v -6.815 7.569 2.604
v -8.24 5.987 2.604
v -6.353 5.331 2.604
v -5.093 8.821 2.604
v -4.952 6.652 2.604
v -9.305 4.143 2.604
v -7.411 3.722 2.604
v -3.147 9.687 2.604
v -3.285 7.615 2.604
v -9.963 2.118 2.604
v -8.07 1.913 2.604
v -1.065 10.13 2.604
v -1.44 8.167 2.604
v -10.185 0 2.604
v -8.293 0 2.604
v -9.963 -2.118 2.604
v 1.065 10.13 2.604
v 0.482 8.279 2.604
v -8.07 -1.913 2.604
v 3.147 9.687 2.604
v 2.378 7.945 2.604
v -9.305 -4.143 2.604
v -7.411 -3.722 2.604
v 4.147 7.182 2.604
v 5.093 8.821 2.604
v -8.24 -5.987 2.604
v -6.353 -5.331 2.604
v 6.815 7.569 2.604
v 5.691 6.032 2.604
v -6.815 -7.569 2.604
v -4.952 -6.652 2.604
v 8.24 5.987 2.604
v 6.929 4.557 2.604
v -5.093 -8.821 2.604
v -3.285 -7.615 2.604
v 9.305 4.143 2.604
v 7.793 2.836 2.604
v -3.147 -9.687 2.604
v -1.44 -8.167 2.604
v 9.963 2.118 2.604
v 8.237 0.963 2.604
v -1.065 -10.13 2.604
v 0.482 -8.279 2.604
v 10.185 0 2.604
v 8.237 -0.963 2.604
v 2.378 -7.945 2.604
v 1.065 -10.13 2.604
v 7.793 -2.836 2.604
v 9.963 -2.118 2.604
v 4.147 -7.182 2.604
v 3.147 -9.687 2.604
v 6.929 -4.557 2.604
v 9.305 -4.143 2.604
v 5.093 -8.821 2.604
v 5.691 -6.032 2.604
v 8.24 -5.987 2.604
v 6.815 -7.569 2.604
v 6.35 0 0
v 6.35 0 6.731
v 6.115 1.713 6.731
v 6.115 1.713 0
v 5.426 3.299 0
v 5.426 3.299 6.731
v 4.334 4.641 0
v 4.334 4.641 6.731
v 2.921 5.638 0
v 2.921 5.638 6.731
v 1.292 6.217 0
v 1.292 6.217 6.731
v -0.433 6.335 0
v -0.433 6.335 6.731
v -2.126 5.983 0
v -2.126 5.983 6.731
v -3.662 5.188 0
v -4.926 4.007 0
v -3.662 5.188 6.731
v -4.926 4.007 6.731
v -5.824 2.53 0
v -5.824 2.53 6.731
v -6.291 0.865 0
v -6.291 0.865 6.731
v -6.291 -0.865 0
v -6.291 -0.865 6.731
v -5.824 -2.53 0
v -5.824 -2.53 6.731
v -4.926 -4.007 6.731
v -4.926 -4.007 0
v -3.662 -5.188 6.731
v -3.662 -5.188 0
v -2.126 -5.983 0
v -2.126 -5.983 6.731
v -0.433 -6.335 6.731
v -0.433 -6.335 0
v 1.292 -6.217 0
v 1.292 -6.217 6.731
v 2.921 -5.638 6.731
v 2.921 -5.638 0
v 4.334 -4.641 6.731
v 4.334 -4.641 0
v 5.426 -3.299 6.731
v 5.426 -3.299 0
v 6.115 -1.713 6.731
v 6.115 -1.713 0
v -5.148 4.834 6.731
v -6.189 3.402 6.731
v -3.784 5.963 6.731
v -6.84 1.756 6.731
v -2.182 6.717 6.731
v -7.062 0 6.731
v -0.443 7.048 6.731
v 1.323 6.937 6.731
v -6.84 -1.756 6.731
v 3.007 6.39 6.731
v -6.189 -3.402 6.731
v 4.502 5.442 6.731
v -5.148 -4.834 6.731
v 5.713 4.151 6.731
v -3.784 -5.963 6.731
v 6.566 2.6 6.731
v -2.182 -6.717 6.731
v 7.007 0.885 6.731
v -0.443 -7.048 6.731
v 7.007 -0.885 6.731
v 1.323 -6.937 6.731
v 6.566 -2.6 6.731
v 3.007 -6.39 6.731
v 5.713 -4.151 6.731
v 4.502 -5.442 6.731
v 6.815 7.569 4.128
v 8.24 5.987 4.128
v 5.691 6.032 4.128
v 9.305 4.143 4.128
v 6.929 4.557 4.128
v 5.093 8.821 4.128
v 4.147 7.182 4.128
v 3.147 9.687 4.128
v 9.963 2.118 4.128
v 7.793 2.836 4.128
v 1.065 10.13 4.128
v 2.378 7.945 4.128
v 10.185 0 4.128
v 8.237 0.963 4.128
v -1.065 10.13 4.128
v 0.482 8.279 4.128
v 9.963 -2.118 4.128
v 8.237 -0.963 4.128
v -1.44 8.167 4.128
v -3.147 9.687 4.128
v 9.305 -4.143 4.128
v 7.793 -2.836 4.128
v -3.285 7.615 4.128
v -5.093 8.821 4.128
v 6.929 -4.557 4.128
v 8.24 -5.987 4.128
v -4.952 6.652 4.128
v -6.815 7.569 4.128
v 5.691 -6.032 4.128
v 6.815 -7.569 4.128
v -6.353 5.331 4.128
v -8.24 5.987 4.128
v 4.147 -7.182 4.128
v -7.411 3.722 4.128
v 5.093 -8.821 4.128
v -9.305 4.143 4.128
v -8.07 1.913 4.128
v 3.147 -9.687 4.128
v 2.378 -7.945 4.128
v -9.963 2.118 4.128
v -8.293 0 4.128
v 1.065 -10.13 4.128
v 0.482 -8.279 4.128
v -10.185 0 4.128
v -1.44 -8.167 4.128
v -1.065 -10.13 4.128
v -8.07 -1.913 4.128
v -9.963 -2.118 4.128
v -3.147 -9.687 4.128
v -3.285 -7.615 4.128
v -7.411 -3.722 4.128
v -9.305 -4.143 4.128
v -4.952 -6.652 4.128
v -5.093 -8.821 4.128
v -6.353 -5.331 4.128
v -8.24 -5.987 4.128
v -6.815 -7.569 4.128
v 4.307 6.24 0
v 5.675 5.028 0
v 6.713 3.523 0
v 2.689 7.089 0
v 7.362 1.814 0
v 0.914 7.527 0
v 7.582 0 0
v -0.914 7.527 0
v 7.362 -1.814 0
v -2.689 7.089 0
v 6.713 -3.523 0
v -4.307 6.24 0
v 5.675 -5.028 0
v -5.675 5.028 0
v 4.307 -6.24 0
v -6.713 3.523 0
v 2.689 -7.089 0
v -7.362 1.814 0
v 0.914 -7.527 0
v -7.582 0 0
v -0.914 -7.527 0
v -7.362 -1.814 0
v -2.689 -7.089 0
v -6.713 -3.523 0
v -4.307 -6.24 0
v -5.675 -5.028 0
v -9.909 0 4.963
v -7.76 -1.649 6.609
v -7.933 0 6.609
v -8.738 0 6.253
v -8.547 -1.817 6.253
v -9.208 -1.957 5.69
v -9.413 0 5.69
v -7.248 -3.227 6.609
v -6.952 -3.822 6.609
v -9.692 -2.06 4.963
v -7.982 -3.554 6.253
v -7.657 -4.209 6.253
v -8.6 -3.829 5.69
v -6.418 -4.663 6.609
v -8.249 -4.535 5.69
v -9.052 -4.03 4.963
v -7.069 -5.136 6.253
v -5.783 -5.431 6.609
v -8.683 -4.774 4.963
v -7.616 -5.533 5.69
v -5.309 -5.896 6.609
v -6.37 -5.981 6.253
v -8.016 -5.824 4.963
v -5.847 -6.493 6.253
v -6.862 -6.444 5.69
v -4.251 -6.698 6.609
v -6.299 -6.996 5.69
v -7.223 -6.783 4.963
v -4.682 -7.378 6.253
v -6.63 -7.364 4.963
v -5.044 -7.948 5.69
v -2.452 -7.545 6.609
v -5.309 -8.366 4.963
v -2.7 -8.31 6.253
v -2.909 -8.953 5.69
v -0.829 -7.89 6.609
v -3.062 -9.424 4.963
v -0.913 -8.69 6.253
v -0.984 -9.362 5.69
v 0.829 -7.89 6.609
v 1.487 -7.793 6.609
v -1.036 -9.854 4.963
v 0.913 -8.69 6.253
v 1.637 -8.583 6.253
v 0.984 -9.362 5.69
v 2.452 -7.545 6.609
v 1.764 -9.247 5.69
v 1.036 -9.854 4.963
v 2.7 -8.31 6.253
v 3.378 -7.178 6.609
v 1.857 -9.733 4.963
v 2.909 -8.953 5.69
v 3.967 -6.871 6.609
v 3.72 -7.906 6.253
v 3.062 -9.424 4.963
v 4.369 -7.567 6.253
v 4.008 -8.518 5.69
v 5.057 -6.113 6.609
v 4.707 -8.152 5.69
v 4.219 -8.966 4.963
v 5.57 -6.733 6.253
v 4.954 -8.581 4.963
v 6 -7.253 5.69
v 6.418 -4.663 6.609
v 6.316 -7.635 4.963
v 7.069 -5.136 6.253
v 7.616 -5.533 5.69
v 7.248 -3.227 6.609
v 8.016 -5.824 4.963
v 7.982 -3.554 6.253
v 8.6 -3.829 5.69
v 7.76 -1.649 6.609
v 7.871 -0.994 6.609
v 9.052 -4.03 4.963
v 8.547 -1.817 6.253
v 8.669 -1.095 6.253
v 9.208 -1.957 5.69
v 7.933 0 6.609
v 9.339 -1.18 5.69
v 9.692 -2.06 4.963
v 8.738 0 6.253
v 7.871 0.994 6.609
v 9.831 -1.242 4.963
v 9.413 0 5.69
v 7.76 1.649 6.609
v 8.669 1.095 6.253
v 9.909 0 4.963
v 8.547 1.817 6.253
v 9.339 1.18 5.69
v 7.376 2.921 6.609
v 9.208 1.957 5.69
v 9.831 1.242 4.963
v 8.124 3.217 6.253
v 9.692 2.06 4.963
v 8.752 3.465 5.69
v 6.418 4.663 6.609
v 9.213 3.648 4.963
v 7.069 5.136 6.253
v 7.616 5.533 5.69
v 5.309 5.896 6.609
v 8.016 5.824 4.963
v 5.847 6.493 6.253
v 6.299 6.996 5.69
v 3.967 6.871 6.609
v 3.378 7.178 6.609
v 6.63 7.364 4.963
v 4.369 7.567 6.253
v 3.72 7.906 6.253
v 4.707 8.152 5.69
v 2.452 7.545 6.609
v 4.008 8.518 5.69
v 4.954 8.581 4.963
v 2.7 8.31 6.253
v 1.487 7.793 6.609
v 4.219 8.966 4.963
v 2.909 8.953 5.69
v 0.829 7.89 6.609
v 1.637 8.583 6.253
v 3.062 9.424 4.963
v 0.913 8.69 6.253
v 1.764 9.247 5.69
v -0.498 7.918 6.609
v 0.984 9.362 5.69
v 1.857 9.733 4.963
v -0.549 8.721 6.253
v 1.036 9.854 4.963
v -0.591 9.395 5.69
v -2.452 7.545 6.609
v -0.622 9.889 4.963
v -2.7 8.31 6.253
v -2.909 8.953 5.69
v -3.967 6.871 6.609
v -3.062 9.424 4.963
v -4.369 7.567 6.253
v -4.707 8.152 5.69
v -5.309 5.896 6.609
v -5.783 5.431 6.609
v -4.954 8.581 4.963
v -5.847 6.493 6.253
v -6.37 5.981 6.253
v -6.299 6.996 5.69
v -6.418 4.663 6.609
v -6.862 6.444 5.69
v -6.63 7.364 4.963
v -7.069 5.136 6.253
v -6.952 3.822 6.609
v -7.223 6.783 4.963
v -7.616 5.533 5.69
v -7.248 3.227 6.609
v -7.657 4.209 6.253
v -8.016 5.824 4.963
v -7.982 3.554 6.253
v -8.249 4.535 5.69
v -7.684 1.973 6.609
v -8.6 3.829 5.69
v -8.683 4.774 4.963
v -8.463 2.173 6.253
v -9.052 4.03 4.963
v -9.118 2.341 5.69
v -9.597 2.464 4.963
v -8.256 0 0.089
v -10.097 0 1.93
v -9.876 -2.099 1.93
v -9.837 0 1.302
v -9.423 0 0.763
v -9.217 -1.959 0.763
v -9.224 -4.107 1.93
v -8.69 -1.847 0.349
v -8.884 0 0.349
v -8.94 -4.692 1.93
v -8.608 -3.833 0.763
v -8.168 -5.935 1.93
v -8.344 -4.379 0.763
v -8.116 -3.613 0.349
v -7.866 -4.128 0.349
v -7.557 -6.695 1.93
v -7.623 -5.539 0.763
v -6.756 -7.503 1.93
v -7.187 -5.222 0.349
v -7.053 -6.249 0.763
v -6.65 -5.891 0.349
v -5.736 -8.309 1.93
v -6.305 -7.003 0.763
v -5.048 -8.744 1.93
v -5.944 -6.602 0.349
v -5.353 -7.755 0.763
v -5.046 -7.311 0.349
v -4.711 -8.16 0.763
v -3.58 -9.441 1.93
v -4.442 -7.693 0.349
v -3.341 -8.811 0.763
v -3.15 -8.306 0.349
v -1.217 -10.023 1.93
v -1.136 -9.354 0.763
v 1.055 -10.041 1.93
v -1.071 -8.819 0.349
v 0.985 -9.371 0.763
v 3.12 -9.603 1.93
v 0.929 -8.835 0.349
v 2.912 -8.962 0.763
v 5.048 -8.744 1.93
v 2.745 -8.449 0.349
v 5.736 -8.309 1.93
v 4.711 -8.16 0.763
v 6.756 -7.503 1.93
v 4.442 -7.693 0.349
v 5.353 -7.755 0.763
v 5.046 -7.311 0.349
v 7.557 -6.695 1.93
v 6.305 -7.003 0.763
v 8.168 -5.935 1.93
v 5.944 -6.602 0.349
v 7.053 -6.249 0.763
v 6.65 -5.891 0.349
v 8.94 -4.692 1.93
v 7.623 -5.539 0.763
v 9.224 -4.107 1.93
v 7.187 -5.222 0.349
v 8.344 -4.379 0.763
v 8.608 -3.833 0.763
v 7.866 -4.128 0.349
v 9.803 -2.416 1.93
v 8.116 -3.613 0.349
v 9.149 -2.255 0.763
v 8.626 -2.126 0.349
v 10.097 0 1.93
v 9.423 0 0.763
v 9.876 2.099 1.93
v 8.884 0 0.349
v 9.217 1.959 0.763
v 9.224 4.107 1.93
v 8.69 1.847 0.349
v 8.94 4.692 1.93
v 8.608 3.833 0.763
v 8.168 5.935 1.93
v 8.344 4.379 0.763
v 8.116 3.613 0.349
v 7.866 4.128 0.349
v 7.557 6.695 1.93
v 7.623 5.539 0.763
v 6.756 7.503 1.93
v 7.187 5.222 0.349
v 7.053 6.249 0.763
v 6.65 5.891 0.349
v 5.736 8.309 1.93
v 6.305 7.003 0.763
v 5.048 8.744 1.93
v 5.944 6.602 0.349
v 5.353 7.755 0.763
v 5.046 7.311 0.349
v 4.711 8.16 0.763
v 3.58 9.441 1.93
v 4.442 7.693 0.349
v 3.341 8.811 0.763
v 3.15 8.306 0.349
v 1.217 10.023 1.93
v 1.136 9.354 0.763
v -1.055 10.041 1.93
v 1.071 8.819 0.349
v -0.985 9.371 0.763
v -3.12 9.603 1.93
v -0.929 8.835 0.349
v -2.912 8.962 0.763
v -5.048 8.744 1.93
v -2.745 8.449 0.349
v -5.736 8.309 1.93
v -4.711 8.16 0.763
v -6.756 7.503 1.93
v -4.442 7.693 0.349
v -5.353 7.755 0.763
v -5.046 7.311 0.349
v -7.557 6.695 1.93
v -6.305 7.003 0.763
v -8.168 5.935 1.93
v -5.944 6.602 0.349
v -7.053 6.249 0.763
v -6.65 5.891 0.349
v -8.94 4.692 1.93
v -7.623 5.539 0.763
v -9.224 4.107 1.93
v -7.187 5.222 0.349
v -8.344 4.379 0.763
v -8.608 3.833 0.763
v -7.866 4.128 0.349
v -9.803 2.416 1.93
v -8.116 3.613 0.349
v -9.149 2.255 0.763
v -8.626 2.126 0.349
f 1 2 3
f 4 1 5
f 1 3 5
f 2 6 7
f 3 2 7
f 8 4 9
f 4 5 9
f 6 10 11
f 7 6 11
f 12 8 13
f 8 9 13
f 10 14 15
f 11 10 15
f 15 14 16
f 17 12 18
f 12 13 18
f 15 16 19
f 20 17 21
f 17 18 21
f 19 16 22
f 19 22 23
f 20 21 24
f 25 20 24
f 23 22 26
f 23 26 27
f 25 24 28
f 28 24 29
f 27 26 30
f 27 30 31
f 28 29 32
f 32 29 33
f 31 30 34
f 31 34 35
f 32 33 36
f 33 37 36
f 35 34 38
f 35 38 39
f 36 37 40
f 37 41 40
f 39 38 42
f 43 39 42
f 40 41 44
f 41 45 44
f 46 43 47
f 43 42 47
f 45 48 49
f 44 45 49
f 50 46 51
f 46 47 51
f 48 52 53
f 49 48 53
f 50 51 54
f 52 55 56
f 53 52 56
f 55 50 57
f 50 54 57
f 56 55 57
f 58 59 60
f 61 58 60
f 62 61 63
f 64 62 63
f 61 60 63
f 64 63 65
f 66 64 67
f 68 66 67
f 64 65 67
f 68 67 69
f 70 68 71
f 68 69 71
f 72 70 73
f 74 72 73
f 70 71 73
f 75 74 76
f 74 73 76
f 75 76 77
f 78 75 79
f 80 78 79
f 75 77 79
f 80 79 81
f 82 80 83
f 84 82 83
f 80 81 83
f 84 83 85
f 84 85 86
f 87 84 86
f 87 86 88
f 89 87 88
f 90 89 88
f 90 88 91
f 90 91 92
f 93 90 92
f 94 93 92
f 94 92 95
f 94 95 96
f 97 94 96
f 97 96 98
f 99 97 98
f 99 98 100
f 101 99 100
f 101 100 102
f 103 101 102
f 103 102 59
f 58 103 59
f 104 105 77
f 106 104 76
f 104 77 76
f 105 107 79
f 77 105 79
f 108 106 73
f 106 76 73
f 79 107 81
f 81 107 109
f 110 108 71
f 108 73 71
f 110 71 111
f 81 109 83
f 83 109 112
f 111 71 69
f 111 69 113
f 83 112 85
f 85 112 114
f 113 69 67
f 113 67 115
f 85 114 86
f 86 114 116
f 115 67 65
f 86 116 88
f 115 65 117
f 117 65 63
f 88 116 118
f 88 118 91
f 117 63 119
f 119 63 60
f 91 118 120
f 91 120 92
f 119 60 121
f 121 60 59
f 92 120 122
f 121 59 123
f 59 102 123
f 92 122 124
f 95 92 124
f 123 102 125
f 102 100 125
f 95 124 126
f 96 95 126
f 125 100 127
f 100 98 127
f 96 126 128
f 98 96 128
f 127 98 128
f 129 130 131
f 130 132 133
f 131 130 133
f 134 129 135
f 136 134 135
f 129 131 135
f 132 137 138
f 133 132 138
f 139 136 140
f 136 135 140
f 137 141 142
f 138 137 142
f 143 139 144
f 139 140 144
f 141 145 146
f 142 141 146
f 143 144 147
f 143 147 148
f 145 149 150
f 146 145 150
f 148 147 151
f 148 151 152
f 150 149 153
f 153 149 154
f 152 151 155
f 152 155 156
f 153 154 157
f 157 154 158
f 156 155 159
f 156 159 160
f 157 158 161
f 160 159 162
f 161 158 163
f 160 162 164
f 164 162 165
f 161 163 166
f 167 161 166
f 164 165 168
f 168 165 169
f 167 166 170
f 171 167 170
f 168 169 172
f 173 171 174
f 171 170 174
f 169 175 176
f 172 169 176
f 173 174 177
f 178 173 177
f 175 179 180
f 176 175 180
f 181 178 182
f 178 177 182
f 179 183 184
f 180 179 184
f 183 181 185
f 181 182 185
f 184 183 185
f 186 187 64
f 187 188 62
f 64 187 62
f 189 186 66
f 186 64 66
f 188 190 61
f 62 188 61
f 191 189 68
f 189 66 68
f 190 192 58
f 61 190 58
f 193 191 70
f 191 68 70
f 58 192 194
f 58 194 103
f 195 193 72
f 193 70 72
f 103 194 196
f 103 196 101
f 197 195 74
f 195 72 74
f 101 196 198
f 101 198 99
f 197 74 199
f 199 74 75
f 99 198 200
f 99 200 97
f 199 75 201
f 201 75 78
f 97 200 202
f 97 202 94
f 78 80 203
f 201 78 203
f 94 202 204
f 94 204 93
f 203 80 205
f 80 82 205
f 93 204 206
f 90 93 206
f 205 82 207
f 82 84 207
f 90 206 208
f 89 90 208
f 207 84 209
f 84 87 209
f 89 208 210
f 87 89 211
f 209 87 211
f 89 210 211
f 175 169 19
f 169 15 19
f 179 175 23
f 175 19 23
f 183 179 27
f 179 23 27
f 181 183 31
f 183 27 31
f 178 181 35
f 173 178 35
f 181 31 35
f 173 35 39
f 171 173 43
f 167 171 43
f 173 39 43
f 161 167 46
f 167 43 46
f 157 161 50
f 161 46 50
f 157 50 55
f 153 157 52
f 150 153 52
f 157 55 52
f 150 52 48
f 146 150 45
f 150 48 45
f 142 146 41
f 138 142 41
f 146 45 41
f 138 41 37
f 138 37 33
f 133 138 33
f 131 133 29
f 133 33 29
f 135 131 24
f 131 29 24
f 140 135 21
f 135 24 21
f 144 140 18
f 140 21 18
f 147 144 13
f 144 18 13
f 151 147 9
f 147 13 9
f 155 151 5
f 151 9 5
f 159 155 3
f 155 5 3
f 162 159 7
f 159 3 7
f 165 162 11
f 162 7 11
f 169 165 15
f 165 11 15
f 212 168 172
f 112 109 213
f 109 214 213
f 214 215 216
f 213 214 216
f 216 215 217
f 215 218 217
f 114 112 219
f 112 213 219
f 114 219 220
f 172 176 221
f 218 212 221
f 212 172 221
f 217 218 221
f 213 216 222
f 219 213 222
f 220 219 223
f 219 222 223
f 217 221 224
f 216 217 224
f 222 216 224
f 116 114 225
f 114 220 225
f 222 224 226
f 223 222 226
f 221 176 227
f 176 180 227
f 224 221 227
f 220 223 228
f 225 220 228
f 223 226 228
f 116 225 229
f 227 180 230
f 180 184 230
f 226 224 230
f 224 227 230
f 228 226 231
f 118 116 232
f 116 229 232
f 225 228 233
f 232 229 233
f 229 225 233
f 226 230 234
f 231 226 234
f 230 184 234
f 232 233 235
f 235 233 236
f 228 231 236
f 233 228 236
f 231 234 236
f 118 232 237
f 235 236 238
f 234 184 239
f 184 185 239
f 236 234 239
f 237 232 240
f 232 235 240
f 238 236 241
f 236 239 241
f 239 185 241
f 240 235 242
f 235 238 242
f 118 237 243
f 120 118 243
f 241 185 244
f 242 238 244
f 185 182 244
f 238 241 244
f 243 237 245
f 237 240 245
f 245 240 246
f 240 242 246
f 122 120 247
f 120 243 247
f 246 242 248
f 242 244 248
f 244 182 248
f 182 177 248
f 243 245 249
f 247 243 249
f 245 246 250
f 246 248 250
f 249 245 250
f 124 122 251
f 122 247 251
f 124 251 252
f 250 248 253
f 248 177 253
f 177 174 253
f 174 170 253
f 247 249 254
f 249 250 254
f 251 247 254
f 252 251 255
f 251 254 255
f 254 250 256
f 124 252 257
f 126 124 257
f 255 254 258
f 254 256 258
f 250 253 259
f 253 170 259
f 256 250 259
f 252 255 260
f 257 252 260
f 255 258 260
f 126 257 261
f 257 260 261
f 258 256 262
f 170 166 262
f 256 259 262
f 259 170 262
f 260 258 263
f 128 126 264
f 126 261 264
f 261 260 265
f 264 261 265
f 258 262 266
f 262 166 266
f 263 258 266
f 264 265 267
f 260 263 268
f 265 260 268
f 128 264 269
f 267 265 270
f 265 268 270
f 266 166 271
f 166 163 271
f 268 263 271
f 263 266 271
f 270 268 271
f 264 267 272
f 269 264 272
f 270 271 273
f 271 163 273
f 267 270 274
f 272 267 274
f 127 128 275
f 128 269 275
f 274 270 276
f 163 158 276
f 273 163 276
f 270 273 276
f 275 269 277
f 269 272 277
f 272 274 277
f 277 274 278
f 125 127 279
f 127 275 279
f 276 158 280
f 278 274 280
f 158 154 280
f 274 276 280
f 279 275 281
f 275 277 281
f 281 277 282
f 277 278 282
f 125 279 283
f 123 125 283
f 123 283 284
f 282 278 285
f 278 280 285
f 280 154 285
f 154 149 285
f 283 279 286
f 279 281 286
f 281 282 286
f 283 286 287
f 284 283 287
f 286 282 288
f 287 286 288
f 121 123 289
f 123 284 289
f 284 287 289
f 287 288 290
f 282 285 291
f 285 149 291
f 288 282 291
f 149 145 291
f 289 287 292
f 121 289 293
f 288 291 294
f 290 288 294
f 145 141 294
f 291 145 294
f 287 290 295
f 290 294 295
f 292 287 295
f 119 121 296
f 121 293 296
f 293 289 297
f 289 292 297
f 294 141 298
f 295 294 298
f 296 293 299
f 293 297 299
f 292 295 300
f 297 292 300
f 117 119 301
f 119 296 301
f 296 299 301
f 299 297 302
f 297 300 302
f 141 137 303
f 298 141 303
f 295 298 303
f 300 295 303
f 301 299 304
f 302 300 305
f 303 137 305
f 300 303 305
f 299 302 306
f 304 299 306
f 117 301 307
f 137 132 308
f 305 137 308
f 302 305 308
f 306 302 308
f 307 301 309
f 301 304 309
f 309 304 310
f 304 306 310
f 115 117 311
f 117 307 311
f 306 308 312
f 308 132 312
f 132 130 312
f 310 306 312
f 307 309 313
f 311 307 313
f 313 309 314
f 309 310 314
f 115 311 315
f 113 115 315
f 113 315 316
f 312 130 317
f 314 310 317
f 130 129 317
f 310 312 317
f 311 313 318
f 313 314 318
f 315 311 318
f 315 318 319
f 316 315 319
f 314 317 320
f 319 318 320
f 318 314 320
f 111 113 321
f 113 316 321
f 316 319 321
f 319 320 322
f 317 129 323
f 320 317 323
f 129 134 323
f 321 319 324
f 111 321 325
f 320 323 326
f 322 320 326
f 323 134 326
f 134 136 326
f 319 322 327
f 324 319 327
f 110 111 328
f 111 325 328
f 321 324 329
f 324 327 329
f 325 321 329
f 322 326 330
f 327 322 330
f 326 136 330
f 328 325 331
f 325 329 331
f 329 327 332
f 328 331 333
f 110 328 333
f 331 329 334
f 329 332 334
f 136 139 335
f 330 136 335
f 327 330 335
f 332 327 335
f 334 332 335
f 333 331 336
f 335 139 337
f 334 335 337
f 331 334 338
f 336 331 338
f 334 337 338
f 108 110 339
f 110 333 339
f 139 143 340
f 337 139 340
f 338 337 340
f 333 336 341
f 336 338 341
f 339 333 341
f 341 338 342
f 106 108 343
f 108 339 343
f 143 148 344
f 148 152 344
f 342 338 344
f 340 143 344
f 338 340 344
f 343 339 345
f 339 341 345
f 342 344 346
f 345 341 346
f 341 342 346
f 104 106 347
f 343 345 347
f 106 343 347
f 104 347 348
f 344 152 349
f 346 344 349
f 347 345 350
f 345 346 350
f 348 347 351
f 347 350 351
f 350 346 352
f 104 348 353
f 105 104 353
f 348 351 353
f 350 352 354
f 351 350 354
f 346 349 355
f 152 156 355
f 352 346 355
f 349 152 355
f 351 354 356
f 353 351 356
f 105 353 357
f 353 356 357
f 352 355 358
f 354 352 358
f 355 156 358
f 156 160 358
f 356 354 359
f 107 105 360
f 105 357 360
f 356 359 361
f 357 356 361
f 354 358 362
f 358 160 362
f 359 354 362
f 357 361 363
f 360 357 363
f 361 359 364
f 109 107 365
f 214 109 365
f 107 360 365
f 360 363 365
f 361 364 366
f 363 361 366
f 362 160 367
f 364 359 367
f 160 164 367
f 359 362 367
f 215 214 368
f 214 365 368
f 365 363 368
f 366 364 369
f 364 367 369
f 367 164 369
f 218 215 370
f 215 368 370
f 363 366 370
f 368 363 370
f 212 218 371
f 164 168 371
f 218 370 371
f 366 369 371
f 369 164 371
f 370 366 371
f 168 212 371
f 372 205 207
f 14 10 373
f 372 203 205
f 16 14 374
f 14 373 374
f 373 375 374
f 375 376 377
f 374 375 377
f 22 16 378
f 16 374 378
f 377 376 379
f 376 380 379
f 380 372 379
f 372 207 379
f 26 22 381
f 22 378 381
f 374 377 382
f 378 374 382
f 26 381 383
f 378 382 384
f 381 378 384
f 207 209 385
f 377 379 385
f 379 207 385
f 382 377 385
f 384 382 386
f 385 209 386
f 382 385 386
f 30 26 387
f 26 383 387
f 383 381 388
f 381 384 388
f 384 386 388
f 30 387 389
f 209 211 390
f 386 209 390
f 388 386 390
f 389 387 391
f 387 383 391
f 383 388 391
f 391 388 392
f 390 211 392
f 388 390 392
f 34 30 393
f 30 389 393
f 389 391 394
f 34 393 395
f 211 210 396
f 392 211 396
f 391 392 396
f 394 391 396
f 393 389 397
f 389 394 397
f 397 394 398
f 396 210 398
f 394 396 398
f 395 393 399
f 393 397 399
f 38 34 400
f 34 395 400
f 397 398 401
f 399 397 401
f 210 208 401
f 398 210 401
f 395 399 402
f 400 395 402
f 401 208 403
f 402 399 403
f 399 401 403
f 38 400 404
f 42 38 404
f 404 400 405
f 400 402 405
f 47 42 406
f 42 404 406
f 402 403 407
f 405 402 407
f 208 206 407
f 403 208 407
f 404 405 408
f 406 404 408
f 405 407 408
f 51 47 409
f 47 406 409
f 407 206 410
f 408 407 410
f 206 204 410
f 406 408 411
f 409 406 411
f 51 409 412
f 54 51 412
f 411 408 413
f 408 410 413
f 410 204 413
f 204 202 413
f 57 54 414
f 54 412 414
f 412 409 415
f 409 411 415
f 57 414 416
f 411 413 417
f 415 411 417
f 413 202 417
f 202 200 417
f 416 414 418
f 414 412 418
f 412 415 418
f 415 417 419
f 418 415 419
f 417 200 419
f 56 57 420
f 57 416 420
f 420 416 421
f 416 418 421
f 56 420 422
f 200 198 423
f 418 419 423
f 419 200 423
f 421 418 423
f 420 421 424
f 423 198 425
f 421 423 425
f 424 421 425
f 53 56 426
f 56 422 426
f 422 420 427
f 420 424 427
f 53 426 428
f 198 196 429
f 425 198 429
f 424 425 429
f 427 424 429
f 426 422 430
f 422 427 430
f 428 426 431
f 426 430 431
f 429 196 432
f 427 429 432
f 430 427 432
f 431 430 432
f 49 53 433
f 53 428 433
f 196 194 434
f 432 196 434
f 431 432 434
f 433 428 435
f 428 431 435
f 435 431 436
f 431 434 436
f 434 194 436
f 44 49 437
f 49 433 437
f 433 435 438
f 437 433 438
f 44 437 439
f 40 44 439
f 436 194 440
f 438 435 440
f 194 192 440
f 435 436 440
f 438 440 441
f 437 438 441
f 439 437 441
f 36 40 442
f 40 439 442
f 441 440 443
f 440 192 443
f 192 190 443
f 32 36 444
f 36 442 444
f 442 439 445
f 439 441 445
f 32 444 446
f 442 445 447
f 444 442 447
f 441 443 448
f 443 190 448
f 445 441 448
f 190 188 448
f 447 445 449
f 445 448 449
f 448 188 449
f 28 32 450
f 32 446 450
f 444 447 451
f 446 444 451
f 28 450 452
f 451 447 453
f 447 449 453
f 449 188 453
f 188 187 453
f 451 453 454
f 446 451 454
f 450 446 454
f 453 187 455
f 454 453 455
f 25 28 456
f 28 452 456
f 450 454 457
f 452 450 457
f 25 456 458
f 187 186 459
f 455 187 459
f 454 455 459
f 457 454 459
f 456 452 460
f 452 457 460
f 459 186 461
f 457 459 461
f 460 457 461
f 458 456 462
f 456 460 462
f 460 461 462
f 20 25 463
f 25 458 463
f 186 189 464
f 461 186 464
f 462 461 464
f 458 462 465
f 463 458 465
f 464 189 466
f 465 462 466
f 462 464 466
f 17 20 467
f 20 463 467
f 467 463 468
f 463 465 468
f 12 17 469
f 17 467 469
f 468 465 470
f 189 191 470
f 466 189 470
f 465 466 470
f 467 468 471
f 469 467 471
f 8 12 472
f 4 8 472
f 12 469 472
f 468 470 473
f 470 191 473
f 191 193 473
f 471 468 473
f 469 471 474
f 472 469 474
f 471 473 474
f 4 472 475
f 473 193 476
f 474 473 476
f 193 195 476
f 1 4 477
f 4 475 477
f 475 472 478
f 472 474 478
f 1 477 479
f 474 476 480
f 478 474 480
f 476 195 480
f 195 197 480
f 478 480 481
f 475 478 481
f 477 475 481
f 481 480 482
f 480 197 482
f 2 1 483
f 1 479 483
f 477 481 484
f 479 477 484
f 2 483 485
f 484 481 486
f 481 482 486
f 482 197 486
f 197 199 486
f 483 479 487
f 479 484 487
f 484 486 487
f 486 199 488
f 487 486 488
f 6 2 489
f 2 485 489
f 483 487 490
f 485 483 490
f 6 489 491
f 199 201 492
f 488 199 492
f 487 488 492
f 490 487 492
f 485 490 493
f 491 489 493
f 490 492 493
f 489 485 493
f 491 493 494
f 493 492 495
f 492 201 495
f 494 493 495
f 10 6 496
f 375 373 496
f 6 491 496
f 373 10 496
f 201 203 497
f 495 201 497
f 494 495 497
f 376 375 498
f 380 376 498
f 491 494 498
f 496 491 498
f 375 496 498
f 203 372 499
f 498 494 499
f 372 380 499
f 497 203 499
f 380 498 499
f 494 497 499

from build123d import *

# Parameters (mm, degrees)
F2_R     = 6.35
F3_DEPTH = 6.732


with BuildPart() as f1:
    # F0 (on Front) → F1 (revolve)
    with BuildSketch(Plane.XZ):
        with BuildLine():
            Line((-7.5819, 0), (0, 0))
            Line((0, 0), (0, 6.731))
            Line((0, 6.731), (-7.062259, 6.731))
            ThreePointArc((-7.062259, 6.731), (-9.09525, 5.994764), (-10.1854, 4.1275))
            Line((-10.1854, 4.1275), (-8.2931, 4.1275))
            Line((-8.2931, 4.1275), (-8.2931, 2.6035))
            Line((-8.2931, 2.6035), (-10.1854, 2.6035))
            ThreePointArc((-10.1854, 2.6035), (-9.422853, 0.762547), (-7.5819, 0))
        make_face()
    revolve(axis=Axis((0, 0, 3.3655), (0, 0, 1)))

    # F2 (on face) → F3 (cut, through all)
    with BuildSketch(Plane.XY.offset(6.731)):
        Circle(F2_R)
    extrude(amount=-F3_DEPTH, mode=Mode.SUBTRACT)


solid = f1.part
